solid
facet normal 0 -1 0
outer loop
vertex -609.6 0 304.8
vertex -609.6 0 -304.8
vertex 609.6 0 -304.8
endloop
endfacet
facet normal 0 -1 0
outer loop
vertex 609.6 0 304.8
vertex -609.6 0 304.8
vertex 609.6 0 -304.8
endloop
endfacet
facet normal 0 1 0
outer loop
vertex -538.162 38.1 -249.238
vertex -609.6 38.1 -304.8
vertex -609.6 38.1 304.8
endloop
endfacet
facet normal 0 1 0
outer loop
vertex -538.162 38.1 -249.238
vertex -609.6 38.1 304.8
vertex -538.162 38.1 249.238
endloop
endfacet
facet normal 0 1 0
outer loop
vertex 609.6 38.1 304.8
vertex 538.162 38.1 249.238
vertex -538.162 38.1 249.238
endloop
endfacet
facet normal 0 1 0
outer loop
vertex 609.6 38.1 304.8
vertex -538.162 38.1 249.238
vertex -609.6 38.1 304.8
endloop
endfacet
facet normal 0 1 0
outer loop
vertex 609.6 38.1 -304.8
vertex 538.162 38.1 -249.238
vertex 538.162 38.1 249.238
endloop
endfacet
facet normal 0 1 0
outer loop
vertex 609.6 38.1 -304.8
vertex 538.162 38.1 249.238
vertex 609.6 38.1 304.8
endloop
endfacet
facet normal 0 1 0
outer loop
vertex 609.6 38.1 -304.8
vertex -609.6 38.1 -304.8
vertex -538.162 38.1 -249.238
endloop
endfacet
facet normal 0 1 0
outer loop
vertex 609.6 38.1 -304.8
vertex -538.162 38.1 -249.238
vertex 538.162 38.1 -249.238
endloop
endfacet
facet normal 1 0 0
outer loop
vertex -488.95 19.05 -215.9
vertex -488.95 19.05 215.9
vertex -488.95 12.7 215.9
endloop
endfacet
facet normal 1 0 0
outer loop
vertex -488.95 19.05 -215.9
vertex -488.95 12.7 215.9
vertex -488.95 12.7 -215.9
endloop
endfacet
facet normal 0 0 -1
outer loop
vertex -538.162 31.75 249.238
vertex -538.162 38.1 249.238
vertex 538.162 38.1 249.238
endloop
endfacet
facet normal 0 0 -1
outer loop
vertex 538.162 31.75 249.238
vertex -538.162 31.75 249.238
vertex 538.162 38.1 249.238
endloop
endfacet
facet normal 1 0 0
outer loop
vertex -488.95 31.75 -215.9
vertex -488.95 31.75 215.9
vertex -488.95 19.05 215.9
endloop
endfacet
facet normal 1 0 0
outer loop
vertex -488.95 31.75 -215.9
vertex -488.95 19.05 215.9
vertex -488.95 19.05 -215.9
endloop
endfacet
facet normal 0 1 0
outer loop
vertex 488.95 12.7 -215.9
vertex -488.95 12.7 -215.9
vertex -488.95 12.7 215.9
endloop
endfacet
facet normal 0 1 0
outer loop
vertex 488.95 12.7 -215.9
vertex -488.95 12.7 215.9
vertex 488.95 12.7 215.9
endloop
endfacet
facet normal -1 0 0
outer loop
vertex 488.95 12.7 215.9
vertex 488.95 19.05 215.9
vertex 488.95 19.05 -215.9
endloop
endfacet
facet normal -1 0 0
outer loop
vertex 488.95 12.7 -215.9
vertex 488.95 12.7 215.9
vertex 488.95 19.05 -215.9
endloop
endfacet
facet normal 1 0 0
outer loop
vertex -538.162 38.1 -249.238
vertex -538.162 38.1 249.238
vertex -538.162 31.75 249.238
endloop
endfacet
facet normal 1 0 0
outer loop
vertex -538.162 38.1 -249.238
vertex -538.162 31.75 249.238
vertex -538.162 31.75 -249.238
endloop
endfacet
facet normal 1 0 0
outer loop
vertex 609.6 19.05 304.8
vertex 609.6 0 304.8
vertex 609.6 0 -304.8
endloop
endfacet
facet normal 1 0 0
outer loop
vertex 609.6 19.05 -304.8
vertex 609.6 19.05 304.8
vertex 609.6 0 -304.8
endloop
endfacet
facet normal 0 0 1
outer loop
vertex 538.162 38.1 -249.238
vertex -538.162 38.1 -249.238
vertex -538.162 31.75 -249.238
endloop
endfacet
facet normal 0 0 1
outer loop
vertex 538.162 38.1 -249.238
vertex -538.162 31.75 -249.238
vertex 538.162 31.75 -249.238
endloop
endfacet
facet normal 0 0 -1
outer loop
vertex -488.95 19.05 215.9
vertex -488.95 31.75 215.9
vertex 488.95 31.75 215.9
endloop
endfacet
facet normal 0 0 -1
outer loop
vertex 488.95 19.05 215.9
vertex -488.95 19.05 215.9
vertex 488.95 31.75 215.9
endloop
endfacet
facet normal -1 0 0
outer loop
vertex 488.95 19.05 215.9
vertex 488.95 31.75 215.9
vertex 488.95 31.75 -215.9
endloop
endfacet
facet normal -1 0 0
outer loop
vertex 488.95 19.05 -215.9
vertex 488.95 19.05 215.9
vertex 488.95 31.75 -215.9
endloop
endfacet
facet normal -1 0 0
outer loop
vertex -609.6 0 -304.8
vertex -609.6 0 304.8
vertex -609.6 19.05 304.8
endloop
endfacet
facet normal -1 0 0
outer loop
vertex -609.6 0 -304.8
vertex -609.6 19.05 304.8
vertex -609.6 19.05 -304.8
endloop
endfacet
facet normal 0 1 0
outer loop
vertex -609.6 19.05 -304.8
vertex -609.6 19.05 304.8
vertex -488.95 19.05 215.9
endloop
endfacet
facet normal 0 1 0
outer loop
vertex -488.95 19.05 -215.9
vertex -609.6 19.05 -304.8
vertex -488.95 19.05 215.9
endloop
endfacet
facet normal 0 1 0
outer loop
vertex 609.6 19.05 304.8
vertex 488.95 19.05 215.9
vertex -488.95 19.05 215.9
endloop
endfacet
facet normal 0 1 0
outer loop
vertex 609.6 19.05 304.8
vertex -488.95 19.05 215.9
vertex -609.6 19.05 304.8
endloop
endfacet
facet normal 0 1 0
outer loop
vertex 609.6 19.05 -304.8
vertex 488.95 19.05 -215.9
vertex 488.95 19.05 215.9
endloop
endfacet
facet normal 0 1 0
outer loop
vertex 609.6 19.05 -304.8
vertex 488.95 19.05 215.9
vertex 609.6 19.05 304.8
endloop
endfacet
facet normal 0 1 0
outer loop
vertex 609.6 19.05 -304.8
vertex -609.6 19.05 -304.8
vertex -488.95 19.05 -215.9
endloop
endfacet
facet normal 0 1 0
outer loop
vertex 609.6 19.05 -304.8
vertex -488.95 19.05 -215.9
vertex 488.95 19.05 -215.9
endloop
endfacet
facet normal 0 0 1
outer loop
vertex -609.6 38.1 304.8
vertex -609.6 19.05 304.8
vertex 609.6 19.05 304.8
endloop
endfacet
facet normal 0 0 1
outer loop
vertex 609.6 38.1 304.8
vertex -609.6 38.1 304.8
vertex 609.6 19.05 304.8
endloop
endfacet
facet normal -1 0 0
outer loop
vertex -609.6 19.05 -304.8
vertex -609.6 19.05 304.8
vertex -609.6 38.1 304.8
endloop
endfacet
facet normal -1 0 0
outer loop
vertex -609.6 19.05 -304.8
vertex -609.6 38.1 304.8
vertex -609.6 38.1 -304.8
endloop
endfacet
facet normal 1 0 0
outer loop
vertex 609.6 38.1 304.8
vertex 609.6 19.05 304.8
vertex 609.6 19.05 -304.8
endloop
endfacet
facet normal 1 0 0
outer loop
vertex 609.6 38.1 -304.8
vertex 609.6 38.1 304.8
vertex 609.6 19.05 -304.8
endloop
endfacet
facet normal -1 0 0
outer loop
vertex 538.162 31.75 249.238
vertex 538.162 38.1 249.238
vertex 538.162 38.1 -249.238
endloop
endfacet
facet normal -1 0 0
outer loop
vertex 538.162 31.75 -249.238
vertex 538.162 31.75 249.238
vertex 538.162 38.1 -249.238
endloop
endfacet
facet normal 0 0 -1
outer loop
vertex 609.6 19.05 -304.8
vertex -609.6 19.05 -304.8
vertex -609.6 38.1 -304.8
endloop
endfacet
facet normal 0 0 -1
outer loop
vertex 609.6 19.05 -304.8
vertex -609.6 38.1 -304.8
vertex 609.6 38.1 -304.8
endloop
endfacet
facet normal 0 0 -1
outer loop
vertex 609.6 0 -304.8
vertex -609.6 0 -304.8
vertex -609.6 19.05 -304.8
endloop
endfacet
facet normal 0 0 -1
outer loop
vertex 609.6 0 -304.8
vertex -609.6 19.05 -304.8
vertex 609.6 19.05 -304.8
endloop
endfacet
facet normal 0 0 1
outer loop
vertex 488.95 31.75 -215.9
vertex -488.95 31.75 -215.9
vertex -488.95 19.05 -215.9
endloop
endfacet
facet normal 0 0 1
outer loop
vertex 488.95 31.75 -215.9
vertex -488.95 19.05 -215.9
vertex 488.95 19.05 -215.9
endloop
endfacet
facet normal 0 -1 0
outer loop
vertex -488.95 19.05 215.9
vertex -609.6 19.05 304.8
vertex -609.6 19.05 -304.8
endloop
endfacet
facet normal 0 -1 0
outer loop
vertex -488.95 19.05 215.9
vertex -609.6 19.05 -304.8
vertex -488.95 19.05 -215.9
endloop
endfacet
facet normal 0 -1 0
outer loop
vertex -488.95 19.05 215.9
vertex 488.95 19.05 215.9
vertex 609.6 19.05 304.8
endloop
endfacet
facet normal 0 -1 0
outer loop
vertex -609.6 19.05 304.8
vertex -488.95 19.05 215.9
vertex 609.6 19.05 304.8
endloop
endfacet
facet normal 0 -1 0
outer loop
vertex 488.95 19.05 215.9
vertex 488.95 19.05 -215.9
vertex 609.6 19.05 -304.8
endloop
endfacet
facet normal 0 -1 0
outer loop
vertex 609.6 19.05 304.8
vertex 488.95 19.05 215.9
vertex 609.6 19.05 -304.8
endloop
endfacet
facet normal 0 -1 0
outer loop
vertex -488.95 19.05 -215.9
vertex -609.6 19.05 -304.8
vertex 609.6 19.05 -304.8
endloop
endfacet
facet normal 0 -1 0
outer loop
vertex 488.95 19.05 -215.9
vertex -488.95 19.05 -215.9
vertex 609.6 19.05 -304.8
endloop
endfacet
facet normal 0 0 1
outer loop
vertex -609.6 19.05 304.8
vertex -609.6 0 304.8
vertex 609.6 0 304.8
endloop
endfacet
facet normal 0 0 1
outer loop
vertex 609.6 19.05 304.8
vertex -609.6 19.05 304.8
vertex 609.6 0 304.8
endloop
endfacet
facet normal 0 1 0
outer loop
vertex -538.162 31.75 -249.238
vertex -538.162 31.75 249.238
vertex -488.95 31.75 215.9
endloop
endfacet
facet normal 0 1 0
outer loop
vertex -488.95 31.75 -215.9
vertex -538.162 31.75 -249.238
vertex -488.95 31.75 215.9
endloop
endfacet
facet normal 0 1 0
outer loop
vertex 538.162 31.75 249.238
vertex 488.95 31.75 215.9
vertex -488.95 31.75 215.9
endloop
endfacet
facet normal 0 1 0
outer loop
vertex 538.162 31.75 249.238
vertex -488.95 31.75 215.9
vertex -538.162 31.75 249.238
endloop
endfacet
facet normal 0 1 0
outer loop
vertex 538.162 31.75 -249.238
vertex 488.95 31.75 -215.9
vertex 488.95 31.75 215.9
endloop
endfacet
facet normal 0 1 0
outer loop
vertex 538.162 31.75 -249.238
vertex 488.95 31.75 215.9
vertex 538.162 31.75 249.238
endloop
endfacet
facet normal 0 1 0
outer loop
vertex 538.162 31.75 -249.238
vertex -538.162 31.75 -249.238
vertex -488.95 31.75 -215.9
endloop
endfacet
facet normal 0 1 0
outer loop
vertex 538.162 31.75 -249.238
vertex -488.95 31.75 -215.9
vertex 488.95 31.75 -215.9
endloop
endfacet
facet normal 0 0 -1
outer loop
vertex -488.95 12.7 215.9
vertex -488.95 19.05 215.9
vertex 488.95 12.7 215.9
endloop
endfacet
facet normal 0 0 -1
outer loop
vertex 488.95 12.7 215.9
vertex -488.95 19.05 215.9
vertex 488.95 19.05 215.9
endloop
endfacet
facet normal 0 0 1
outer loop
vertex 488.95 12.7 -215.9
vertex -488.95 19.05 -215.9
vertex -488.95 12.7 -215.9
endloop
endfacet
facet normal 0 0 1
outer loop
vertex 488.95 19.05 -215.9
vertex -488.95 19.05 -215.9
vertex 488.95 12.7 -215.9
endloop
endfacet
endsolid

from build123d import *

# Parameters (mm, degrees)
SKETCH1_W        = 1219.2
SKETCH1_H        = 609.6
MDF_SLAB1_DEPTH  = 19.05
SKETCH2_W        = 1219.2
SKETCH2_H        = 609.6
MDF_SLAB2_DEPTH  = 19.05
SKETCH3_W        = 1076.325
SKETCH3_H        = 498.475
WINDOW_CUT_DEPTH = 6.35
SKETCH4_W        = 977.9
SKETCH4_H        = 431.8
MIRROR_CUT_DEPTH = 19.05


with BuildPart() as part:
    # Sketch1 → MDF_Slab1 (new body)
    with BuildSketch(Plane(origin=(0, 0, 0), x_dir=(1, 0, 0), z_dir=(0, 1, 0))):
        Rectangle(SKETCH1_W, SKETCH1_H)
    extrude(amount=MDF_SLAB1_DEPTH)


with BuildPart() as body_2:
    # Sketch2 → MDF_Slab2 (new body)
    with BuildSketch(Plane(origin=(0, 19.05, 0), x_dir=(1, 0, 0), z_dir=(0, 1, 0))):
        Rectangle(SKETCH2_W, SKETCH2_H)
    extrude(amount=MDF_SLAB2_DEPTH)

    # Sketch3 → Window_Cut (cut)
    with BuildSketch(Plane(origin=(0, 38.1, 0), x_dir=(1, 0, 0), z_dir=(0, 1, 0))):
        Rectangle(SKETCH3_W, SKETCH3_H)
    extrude(amount=-WINDOW_CUT_DEPTH, mode=Mode.SUBTRACT)


with BuildPart() as mirror_cut_tool:
    # Sketch4 → Mirror_Cut (new body)
    with BuildSketch(Plane(origin=(0, 31.75, 0), x_dir=(1, 0, 0), z_dir=(0, 1, 0))):
        Rectangle(SKETCH4_W, SKETCH4_H)
    extrude(amount=-MIRROR_CUT_DEPTH)


with BuildPart() as part_1:
    add(part.part)

    # Mirror_Cut: cut by mirror_cut_tool
    add(mirror_cut_tool.part, mode=Mode.SUBTRACT)


with BuildPart() as body_2_1:
    add(body_2.part)

    # Mirror_Cut: cut by mirror_cut_tool
    add(mirror_cut_tool.part, mode=Mode.SUBTRACT)


solid = Compound([part_1.part, body_2_1.part])
